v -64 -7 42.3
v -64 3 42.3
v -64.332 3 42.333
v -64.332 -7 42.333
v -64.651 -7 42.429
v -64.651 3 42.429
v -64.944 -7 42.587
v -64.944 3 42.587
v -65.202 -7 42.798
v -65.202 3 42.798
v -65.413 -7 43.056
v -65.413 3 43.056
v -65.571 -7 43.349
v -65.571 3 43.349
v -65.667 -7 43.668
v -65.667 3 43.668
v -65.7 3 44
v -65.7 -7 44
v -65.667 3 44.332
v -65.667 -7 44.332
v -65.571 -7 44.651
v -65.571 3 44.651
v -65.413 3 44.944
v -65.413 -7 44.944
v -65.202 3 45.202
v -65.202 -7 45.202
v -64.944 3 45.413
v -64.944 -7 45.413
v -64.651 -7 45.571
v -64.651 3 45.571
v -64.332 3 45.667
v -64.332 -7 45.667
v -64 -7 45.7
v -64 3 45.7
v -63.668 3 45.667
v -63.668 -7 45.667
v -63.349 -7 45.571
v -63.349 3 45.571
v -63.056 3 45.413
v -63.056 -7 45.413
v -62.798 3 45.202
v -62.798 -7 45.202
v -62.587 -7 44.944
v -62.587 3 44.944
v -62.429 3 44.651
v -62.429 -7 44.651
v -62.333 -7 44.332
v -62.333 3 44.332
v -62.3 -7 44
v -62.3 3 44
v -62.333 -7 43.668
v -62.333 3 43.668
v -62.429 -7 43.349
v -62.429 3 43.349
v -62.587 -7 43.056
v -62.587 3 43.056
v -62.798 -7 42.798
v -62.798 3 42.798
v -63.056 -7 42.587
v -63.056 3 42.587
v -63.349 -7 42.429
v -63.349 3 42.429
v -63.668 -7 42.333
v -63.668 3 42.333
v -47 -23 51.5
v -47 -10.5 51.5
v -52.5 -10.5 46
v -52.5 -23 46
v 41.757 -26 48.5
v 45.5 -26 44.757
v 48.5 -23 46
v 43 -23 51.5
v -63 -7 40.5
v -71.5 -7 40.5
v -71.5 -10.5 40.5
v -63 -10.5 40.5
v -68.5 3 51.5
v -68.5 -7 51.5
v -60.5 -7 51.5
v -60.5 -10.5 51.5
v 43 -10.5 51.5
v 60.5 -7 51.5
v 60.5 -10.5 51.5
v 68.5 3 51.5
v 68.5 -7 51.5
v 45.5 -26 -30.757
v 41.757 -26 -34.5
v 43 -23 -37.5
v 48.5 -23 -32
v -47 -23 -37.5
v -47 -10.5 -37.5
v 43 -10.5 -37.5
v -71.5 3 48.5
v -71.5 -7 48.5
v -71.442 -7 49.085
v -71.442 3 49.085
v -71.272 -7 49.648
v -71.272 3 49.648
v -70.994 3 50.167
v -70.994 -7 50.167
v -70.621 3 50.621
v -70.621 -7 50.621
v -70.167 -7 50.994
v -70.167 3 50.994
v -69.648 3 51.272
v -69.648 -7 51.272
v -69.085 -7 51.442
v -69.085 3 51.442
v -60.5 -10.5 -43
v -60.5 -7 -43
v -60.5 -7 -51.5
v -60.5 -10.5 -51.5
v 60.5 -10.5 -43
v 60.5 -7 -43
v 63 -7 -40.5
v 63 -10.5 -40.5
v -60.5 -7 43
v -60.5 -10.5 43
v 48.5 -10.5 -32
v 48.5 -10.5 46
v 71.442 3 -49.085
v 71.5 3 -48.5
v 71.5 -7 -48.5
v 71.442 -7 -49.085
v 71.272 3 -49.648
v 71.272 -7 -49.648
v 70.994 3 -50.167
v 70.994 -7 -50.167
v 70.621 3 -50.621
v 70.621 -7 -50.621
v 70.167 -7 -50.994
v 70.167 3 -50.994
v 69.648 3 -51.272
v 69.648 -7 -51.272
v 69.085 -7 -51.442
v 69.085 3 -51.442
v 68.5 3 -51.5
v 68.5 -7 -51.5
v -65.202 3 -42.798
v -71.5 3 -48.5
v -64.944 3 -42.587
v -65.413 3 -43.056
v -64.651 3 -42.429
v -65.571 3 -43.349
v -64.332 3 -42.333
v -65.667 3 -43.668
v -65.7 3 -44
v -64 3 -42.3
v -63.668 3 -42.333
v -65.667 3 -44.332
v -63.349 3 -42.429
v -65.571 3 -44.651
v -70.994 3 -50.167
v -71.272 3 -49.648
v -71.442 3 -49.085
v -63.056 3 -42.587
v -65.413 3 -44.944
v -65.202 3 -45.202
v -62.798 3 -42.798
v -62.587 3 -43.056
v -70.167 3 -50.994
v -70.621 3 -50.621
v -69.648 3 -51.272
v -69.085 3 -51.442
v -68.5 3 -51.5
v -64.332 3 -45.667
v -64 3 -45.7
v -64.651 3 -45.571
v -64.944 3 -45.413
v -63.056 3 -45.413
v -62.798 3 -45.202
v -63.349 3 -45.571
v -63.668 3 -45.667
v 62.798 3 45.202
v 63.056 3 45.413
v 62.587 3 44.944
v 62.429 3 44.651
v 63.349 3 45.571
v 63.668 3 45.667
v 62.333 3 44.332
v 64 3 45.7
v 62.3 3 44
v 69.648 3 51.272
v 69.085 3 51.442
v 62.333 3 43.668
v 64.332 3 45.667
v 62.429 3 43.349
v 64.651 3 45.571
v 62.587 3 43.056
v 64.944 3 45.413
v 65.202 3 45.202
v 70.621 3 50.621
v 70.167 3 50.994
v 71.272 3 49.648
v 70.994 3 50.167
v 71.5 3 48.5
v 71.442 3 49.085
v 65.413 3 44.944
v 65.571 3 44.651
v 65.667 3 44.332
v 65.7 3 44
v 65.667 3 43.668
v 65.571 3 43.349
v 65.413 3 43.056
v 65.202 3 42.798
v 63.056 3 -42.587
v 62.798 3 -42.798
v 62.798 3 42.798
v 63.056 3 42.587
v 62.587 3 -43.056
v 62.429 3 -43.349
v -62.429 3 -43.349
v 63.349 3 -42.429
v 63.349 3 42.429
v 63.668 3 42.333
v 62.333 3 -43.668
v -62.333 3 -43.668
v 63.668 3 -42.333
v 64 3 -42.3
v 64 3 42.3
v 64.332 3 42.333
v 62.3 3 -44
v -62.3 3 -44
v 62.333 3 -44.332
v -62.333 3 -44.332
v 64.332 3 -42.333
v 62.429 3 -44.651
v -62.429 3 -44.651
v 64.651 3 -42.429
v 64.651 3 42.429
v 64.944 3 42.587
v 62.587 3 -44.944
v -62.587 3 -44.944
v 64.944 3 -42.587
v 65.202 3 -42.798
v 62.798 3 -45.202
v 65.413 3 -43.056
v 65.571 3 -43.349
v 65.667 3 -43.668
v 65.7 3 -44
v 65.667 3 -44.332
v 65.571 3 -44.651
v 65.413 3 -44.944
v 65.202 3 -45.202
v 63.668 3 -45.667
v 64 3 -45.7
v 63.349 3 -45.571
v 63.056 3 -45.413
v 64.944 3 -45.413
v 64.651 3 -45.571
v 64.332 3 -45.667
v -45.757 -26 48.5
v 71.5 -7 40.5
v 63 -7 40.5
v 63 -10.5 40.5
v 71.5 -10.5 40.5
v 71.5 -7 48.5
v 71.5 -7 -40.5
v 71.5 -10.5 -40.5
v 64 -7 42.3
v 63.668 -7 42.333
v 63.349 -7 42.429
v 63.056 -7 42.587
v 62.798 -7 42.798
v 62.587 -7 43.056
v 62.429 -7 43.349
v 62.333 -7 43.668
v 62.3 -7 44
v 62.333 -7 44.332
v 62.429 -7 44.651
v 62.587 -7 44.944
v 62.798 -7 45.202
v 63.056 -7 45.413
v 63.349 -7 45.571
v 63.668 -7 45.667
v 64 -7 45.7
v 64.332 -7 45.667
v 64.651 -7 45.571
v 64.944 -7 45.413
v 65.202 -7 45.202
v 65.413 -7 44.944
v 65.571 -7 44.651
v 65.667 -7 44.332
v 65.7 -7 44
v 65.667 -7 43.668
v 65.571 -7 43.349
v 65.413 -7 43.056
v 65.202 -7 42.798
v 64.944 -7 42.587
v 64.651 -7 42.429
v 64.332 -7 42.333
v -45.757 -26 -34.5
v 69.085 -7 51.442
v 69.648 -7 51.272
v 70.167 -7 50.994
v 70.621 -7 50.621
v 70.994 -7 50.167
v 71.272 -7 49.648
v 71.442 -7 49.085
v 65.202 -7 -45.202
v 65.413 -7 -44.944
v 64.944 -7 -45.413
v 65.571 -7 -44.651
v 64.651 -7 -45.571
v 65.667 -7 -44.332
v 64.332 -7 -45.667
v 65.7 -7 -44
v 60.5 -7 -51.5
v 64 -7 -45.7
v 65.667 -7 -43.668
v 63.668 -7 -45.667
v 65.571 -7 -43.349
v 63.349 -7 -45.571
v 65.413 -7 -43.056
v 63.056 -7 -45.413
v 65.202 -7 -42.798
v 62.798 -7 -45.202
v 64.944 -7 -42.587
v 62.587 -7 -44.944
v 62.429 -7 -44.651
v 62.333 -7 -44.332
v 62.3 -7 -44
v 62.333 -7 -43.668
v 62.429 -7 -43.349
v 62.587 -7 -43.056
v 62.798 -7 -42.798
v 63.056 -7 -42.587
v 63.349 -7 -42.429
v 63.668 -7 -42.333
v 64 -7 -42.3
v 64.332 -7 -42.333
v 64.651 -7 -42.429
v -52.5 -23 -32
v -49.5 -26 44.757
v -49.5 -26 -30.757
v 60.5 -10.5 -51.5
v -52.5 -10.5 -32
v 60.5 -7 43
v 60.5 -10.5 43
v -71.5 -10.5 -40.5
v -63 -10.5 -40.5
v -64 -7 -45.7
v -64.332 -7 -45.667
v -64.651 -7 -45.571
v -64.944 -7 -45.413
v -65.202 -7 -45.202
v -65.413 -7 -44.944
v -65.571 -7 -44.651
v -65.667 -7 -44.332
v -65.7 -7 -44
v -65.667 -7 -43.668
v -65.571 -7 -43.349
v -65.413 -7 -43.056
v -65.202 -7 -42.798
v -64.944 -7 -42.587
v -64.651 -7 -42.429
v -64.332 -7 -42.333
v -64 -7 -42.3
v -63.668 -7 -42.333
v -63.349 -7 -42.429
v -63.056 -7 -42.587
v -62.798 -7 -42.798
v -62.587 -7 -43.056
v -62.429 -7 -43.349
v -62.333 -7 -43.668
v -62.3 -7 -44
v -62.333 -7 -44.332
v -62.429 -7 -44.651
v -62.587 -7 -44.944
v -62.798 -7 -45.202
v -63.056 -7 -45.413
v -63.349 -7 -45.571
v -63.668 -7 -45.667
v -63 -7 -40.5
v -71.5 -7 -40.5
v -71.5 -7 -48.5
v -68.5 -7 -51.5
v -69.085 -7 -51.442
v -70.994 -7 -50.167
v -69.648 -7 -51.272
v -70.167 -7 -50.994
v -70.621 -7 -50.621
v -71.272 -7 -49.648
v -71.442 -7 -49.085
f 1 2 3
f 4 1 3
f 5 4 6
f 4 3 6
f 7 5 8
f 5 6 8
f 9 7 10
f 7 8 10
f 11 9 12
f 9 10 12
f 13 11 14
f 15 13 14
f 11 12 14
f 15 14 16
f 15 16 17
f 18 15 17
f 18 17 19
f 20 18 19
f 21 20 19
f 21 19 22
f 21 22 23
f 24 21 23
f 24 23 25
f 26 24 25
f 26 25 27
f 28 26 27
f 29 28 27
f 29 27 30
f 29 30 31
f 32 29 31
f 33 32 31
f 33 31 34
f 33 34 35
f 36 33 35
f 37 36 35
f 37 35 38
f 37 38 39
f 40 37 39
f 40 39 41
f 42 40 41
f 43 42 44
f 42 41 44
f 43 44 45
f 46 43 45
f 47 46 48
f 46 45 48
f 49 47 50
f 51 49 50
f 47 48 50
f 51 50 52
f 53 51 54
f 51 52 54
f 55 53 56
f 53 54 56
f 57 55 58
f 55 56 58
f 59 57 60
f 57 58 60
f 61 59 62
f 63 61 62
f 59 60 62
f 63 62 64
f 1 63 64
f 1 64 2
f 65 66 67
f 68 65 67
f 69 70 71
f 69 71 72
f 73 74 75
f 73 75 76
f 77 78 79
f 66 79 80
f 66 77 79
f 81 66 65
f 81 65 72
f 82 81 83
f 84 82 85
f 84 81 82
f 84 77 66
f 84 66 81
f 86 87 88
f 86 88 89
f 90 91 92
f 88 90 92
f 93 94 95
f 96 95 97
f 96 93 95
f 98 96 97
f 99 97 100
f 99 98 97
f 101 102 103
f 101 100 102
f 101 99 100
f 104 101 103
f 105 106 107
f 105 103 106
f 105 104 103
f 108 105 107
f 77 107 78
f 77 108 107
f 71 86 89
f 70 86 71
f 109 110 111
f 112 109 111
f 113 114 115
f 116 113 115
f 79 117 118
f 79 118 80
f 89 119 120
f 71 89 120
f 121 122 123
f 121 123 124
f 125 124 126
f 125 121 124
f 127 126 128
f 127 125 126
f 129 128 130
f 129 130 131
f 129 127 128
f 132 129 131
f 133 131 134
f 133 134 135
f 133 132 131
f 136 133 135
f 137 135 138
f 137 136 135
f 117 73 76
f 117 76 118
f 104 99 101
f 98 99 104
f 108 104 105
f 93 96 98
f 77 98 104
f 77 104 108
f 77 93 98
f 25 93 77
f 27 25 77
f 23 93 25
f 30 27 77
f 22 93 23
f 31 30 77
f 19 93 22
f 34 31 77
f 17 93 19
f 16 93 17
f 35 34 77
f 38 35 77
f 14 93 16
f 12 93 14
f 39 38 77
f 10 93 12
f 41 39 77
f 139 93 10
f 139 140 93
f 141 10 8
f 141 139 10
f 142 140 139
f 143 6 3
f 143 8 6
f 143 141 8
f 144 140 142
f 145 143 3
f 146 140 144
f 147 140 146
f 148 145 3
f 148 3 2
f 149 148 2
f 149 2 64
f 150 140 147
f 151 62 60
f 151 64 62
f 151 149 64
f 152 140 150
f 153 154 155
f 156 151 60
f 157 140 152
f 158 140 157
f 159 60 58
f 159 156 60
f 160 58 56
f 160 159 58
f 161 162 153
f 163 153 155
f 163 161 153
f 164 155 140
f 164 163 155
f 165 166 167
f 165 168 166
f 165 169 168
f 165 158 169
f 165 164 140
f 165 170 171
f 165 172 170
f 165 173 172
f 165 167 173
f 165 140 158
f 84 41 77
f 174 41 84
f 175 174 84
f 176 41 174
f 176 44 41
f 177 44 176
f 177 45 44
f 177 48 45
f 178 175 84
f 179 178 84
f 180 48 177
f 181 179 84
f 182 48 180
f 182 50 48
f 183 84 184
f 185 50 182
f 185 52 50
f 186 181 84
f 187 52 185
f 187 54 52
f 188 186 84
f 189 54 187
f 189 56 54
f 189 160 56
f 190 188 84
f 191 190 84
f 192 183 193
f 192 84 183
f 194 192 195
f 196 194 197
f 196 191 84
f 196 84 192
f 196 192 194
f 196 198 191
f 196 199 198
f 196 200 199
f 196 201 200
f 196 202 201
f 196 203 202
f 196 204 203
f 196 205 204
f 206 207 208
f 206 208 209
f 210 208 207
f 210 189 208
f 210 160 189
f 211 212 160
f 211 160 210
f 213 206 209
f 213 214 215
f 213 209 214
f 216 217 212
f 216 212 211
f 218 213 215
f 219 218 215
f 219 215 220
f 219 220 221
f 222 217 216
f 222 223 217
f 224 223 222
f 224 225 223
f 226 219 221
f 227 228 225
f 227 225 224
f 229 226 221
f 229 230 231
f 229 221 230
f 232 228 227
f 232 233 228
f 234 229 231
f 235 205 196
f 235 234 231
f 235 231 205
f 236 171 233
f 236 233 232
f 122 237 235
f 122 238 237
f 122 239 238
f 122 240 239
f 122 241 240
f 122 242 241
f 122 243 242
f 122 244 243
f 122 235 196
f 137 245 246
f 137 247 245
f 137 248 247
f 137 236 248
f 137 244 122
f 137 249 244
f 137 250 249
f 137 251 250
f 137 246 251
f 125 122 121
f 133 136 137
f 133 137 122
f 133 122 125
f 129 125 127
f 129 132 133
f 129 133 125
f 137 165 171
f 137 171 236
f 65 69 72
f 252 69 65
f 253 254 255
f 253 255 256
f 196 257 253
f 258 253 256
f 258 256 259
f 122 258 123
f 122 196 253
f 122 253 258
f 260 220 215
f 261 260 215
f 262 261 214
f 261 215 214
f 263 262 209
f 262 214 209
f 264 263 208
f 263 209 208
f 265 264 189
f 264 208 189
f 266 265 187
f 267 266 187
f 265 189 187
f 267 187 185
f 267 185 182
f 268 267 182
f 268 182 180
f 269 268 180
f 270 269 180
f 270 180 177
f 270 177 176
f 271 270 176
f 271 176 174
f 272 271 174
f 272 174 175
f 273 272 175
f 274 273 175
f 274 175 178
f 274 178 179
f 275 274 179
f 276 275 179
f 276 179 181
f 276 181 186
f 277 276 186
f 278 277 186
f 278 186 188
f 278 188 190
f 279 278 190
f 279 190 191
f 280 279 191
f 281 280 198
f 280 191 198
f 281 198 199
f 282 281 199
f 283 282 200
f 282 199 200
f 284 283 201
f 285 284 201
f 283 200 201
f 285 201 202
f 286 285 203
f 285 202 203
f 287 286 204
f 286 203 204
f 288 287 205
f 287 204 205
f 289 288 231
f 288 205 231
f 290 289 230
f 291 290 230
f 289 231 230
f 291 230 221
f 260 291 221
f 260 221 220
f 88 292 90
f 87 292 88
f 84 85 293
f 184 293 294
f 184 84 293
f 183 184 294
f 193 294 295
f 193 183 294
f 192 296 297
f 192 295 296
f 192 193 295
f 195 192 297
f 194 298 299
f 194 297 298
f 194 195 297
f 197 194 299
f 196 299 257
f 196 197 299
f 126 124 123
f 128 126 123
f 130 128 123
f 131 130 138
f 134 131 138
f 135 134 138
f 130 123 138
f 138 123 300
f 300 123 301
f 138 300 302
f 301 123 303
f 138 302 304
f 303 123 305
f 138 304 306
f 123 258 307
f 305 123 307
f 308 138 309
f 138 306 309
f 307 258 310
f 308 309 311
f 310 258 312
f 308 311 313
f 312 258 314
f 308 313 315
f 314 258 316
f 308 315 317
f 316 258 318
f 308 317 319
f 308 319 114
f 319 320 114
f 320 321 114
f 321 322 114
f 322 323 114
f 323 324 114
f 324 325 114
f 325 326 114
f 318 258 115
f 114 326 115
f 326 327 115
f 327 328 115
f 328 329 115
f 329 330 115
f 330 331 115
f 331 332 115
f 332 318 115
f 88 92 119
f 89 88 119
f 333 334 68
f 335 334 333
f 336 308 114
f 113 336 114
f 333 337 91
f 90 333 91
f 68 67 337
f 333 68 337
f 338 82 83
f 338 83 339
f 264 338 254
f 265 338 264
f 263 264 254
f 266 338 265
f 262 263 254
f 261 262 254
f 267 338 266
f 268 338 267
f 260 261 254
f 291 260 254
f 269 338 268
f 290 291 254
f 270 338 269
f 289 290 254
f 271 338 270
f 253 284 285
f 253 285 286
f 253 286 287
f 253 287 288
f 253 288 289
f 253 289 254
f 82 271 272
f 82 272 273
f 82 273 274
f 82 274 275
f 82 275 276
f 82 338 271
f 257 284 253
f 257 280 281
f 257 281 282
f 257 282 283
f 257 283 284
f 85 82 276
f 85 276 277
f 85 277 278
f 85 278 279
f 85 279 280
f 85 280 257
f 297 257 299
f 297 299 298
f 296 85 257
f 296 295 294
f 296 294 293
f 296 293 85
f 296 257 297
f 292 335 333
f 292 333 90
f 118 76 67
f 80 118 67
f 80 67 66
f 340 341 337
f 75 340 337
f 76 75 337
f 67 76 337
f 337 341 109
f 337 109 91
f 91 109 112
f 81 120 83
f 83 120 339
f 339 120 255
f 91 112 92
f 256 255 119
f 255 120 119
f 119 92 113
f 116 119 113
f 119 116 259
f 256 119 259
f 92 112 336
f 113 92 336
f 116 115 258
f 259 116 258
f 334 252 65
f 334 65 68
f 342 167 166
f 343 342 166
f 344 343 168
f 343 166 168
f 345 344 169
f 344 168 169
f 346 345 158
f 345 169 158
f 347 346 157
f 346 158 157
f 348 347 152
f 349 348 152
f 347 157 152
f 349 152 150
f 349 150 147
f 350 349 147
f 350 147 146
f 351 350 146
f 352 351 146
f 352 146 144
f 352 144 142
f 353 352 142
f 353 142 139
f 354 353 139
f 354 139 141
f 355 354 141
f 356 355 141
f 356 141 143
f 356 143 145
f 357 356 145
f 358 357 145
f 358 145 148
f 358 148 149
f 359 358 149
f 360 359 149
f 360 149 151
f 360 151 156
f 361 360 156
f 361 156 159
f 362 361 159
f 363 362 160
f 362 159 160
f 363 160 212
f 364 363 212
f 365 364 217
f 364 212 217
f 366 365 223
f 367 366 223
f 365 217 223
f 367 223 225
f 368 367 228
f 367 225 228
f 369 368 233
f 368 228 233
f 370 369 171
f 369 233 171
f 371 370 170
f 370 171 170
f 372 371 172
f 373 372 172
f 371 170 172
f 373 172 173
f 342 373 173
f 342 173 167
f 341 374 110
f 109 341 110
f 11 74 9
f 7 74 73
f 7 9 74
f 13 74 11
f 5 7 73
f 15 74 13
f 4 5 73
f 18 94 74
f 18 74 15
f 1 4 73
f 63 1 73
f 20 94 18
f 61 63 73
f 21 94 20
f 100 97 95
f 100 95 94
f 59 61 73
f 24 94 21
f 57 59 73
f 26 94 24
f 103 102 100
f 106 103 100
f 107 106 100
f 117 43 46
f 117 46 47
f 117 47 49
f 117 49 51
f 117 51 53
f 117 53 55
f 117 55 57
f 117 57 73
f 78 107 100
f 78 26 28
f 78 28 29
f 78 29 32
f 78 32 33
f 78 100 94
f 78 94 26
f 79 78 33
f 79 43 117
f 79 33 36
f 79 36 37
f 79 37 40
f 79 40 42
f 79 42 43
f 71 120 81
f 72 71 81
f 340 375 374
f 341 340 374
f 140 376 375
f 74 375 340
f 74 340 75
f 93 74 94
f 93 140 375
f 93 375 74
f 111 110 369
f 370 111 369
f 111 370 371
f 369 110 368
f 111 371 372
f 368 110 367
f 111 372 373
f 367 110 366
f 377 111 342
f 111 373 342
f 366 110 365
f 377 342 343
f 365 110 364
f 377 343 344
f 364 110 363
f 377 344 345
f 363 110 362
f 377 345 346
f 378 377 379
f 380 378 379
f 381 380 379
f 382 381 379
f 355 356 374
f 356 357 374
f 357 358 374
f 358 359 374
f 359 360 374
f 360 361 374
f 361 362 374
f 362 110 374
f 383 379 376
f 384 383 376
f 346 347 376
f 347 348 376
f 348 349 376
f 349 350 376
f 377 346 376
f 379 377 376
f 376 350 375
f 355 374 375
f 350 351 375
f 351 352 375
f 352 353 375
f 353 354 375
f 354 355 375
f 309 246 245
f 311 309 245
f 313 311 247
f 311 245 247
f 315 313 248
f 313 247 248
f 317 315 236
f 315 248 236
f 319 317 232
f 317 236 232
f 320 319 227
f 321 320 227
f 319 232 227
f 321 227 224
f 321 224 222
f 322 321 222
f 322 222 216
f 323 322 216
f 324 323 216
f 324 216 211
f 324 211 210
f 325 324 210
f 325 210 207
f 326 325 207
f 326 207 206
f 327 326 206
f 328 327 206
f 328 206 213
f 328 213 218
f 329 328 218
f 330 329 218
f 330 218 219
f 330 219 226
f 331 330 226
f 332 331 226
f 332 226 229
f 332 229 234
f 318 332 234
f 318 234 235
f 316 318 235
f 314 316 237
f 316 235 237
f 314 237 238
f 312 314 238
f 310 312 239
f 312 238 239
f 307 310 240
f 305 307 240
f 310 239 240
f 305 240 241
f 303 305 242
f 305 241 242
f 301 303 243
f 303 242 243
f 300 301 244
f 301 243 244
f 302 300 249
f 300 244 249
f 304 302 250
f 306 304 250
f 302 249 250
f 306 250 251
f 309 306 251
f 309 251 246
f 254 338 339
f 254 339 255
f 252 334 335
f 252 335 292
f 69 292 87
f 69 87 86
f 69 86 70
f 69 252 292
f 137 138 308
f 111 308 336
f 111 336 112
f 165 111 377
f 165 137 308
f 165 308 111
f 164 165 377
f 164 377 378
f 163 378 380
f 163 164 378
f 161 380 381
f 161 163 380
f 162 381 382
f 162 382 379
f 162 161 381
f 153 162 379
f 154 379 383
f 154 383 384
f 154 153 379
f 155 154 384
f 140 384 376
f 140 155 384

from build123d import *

# Parameters (mm, degrees)
SKETCH1_R           = 1.7
BOSS_EXTRUDE1_DEPTH = 13.5
CUT_EXTRUDE2_START  = -3.5
CUT_EXTRUDE2_DEPTH  = 3.5
BOSS_EXTRUDE2_DEPTH = 15.5
CHAMFER1_SIZE       = 3


with BuildPart() as part:
    # Sketch1 → Boss-Extrude1 (new body)
    with BuildSketch(Plane(origin=(0, 3, 0), x_dir=(1, 0, 0), z_dir=(0, 1, 0))):
        with BuildLine():
            Line((71.5, -48.5), (71.5, 48.5))
            ThreePointArc((71.5, 48.5), (70.621320344, 50.621320344), (68.5, 51.5))
            Line((68.5, 51.5), (-68.5, 51.5))
            ThreePointArc((-68.5, 51.5), (-70.621320344, 50.621320344), (-71.5, 48.5))
            Line((-71.5, 48.5), (-71.5, -48.5))
            ThreePointArc((-71.5, -48.5), (-70.621320344, -50.621320344), (-68.5, -51.5))
            Line((-68.5, -51.5), (68.5, -51.5))
            ThreePointArc((68.5, -51.5), (70.621320344, -50.621320344), (71.5, -48.5))
        make_face()
        with Locations(Location((-64, 44, 0), (0, 0, 90))):
            Circle(SKETCH1_R, mode=Mode.SUBTRACT)
        with Locations(Location((-64, -44, 0), (0, 0, 90))):
            Circle(SKETCH1_R, mode=Mode.SUBTRACT)
        with Locations(Location((64, -44, 0), (0, 0, 90))):
            Circle(SKETCH1_R, mode=Mode.SUBTRACT)
        with Locations(Location((64, 44, 0), (0, 0, 90))):
            Circle(SKETCH1_R, mode=Mode.SUBTRACT)
    extrude(amount=-BOSS_EXTRUDE1_DEPTH)

    # Sketch2 → Cut-Extrude2 (cut)
    with BuildSketch(Plane.XZ.offset(10.5).offset(CUT_EXTRUDE2_START)):
        with BuildLine():
            Line((-71.5, -40.5), (-63, -40.5))
            Line((-63, -40.5), (-60.5, -43))
            Line((-60.5, -43), (-60.5, -51.5))
            Line((-60.5, -51.5), (-68.5, -51.5))
            ThreePointArc((-68.5, -51.5), (-70.621320344, -50.621320344), (-71.5, -48.5))
            Line((-71.5, -48.5), (-71.5, -40.5))
        make_face()
        with BuildLine():
            Line((-71.5, 40.5), (-63, 40.5))
            Line((-63, 40.5), (-60.5, 43))
            Line((-60.5, 43), (-60.5, 51.5))
            Line((-60.5, 51.5), (-68.5, 51.5))
            ThreePointArc((-68.5, 51.5), (-70.621320344, 50.621320344), (-71.5, 48.5))
            Line((-71.5, 48.5), (-71.5, 40.5))
        make_face()
        with BuildLine():
            Line((60.5, 51.5), (60.5, 43))
            Line((60.5, 43), (63, 40.5))
            Line((63, 40.5), (71.5, 40.5))
            Line((71.5, 40.5), (71.5, 48.5))
            ThreePointArc((71.5, 48.5), (70.621320344, 50.621320344), (68.5, 51.5))
            Line((68.5, 51.5), (60.5, 51.5))
        make_face()
        with BuildLine():
            Line((60.5, -51.5), (60.5, -43))
            Line((60.5, -43), (63, -40.5))
            Line((63, -40.5), (71.5, -40.5))
            Line((71.5, -40.5), (71.5, -48.5))
            ThreePointArc((71.5, -48.5), (70.621320344, -50.621320344), (68.5, -51.5))
            Line((68.5, -51.5), (60.5, -51.5))
        make_face()
    extrude(amount=CUT_EXTRUDE2_DEPTH, mode=Mode.SUBTRACT)

    # Sketch3 → Boss-Extrude2 (add)
    with BuildSketch(Plane.XZ.offset(10.5)):
        Polygon((-52.5, 46), (-52.5, -32), (-47, -37.5), (43, -37.5), (48.5, -32), (48.5, 46), (43, 51.5), (-47, 51.5), align=None)
    extrude(amount=BOSS_EXTRUDE2_DEPTH)

    # Chamfer1
    chamfer1_edges = [part.edges().sort_by_distance(p)[0] for p in [
        (-2, -26, -37.5),
        (-49.75, -26, -34.75),
        (48.5, -26, 7),
        (45.75, -26, -34.75),
        (45.75, -26, 48.75),
        (-2, -26, 51.5),
        (-49.75, -26, 48.75),
        (-52.5, -26, 7),
    ]]
    chamfer(chamfer1_edges, length=CHAMFER1_SIZE)


solid = part.part
